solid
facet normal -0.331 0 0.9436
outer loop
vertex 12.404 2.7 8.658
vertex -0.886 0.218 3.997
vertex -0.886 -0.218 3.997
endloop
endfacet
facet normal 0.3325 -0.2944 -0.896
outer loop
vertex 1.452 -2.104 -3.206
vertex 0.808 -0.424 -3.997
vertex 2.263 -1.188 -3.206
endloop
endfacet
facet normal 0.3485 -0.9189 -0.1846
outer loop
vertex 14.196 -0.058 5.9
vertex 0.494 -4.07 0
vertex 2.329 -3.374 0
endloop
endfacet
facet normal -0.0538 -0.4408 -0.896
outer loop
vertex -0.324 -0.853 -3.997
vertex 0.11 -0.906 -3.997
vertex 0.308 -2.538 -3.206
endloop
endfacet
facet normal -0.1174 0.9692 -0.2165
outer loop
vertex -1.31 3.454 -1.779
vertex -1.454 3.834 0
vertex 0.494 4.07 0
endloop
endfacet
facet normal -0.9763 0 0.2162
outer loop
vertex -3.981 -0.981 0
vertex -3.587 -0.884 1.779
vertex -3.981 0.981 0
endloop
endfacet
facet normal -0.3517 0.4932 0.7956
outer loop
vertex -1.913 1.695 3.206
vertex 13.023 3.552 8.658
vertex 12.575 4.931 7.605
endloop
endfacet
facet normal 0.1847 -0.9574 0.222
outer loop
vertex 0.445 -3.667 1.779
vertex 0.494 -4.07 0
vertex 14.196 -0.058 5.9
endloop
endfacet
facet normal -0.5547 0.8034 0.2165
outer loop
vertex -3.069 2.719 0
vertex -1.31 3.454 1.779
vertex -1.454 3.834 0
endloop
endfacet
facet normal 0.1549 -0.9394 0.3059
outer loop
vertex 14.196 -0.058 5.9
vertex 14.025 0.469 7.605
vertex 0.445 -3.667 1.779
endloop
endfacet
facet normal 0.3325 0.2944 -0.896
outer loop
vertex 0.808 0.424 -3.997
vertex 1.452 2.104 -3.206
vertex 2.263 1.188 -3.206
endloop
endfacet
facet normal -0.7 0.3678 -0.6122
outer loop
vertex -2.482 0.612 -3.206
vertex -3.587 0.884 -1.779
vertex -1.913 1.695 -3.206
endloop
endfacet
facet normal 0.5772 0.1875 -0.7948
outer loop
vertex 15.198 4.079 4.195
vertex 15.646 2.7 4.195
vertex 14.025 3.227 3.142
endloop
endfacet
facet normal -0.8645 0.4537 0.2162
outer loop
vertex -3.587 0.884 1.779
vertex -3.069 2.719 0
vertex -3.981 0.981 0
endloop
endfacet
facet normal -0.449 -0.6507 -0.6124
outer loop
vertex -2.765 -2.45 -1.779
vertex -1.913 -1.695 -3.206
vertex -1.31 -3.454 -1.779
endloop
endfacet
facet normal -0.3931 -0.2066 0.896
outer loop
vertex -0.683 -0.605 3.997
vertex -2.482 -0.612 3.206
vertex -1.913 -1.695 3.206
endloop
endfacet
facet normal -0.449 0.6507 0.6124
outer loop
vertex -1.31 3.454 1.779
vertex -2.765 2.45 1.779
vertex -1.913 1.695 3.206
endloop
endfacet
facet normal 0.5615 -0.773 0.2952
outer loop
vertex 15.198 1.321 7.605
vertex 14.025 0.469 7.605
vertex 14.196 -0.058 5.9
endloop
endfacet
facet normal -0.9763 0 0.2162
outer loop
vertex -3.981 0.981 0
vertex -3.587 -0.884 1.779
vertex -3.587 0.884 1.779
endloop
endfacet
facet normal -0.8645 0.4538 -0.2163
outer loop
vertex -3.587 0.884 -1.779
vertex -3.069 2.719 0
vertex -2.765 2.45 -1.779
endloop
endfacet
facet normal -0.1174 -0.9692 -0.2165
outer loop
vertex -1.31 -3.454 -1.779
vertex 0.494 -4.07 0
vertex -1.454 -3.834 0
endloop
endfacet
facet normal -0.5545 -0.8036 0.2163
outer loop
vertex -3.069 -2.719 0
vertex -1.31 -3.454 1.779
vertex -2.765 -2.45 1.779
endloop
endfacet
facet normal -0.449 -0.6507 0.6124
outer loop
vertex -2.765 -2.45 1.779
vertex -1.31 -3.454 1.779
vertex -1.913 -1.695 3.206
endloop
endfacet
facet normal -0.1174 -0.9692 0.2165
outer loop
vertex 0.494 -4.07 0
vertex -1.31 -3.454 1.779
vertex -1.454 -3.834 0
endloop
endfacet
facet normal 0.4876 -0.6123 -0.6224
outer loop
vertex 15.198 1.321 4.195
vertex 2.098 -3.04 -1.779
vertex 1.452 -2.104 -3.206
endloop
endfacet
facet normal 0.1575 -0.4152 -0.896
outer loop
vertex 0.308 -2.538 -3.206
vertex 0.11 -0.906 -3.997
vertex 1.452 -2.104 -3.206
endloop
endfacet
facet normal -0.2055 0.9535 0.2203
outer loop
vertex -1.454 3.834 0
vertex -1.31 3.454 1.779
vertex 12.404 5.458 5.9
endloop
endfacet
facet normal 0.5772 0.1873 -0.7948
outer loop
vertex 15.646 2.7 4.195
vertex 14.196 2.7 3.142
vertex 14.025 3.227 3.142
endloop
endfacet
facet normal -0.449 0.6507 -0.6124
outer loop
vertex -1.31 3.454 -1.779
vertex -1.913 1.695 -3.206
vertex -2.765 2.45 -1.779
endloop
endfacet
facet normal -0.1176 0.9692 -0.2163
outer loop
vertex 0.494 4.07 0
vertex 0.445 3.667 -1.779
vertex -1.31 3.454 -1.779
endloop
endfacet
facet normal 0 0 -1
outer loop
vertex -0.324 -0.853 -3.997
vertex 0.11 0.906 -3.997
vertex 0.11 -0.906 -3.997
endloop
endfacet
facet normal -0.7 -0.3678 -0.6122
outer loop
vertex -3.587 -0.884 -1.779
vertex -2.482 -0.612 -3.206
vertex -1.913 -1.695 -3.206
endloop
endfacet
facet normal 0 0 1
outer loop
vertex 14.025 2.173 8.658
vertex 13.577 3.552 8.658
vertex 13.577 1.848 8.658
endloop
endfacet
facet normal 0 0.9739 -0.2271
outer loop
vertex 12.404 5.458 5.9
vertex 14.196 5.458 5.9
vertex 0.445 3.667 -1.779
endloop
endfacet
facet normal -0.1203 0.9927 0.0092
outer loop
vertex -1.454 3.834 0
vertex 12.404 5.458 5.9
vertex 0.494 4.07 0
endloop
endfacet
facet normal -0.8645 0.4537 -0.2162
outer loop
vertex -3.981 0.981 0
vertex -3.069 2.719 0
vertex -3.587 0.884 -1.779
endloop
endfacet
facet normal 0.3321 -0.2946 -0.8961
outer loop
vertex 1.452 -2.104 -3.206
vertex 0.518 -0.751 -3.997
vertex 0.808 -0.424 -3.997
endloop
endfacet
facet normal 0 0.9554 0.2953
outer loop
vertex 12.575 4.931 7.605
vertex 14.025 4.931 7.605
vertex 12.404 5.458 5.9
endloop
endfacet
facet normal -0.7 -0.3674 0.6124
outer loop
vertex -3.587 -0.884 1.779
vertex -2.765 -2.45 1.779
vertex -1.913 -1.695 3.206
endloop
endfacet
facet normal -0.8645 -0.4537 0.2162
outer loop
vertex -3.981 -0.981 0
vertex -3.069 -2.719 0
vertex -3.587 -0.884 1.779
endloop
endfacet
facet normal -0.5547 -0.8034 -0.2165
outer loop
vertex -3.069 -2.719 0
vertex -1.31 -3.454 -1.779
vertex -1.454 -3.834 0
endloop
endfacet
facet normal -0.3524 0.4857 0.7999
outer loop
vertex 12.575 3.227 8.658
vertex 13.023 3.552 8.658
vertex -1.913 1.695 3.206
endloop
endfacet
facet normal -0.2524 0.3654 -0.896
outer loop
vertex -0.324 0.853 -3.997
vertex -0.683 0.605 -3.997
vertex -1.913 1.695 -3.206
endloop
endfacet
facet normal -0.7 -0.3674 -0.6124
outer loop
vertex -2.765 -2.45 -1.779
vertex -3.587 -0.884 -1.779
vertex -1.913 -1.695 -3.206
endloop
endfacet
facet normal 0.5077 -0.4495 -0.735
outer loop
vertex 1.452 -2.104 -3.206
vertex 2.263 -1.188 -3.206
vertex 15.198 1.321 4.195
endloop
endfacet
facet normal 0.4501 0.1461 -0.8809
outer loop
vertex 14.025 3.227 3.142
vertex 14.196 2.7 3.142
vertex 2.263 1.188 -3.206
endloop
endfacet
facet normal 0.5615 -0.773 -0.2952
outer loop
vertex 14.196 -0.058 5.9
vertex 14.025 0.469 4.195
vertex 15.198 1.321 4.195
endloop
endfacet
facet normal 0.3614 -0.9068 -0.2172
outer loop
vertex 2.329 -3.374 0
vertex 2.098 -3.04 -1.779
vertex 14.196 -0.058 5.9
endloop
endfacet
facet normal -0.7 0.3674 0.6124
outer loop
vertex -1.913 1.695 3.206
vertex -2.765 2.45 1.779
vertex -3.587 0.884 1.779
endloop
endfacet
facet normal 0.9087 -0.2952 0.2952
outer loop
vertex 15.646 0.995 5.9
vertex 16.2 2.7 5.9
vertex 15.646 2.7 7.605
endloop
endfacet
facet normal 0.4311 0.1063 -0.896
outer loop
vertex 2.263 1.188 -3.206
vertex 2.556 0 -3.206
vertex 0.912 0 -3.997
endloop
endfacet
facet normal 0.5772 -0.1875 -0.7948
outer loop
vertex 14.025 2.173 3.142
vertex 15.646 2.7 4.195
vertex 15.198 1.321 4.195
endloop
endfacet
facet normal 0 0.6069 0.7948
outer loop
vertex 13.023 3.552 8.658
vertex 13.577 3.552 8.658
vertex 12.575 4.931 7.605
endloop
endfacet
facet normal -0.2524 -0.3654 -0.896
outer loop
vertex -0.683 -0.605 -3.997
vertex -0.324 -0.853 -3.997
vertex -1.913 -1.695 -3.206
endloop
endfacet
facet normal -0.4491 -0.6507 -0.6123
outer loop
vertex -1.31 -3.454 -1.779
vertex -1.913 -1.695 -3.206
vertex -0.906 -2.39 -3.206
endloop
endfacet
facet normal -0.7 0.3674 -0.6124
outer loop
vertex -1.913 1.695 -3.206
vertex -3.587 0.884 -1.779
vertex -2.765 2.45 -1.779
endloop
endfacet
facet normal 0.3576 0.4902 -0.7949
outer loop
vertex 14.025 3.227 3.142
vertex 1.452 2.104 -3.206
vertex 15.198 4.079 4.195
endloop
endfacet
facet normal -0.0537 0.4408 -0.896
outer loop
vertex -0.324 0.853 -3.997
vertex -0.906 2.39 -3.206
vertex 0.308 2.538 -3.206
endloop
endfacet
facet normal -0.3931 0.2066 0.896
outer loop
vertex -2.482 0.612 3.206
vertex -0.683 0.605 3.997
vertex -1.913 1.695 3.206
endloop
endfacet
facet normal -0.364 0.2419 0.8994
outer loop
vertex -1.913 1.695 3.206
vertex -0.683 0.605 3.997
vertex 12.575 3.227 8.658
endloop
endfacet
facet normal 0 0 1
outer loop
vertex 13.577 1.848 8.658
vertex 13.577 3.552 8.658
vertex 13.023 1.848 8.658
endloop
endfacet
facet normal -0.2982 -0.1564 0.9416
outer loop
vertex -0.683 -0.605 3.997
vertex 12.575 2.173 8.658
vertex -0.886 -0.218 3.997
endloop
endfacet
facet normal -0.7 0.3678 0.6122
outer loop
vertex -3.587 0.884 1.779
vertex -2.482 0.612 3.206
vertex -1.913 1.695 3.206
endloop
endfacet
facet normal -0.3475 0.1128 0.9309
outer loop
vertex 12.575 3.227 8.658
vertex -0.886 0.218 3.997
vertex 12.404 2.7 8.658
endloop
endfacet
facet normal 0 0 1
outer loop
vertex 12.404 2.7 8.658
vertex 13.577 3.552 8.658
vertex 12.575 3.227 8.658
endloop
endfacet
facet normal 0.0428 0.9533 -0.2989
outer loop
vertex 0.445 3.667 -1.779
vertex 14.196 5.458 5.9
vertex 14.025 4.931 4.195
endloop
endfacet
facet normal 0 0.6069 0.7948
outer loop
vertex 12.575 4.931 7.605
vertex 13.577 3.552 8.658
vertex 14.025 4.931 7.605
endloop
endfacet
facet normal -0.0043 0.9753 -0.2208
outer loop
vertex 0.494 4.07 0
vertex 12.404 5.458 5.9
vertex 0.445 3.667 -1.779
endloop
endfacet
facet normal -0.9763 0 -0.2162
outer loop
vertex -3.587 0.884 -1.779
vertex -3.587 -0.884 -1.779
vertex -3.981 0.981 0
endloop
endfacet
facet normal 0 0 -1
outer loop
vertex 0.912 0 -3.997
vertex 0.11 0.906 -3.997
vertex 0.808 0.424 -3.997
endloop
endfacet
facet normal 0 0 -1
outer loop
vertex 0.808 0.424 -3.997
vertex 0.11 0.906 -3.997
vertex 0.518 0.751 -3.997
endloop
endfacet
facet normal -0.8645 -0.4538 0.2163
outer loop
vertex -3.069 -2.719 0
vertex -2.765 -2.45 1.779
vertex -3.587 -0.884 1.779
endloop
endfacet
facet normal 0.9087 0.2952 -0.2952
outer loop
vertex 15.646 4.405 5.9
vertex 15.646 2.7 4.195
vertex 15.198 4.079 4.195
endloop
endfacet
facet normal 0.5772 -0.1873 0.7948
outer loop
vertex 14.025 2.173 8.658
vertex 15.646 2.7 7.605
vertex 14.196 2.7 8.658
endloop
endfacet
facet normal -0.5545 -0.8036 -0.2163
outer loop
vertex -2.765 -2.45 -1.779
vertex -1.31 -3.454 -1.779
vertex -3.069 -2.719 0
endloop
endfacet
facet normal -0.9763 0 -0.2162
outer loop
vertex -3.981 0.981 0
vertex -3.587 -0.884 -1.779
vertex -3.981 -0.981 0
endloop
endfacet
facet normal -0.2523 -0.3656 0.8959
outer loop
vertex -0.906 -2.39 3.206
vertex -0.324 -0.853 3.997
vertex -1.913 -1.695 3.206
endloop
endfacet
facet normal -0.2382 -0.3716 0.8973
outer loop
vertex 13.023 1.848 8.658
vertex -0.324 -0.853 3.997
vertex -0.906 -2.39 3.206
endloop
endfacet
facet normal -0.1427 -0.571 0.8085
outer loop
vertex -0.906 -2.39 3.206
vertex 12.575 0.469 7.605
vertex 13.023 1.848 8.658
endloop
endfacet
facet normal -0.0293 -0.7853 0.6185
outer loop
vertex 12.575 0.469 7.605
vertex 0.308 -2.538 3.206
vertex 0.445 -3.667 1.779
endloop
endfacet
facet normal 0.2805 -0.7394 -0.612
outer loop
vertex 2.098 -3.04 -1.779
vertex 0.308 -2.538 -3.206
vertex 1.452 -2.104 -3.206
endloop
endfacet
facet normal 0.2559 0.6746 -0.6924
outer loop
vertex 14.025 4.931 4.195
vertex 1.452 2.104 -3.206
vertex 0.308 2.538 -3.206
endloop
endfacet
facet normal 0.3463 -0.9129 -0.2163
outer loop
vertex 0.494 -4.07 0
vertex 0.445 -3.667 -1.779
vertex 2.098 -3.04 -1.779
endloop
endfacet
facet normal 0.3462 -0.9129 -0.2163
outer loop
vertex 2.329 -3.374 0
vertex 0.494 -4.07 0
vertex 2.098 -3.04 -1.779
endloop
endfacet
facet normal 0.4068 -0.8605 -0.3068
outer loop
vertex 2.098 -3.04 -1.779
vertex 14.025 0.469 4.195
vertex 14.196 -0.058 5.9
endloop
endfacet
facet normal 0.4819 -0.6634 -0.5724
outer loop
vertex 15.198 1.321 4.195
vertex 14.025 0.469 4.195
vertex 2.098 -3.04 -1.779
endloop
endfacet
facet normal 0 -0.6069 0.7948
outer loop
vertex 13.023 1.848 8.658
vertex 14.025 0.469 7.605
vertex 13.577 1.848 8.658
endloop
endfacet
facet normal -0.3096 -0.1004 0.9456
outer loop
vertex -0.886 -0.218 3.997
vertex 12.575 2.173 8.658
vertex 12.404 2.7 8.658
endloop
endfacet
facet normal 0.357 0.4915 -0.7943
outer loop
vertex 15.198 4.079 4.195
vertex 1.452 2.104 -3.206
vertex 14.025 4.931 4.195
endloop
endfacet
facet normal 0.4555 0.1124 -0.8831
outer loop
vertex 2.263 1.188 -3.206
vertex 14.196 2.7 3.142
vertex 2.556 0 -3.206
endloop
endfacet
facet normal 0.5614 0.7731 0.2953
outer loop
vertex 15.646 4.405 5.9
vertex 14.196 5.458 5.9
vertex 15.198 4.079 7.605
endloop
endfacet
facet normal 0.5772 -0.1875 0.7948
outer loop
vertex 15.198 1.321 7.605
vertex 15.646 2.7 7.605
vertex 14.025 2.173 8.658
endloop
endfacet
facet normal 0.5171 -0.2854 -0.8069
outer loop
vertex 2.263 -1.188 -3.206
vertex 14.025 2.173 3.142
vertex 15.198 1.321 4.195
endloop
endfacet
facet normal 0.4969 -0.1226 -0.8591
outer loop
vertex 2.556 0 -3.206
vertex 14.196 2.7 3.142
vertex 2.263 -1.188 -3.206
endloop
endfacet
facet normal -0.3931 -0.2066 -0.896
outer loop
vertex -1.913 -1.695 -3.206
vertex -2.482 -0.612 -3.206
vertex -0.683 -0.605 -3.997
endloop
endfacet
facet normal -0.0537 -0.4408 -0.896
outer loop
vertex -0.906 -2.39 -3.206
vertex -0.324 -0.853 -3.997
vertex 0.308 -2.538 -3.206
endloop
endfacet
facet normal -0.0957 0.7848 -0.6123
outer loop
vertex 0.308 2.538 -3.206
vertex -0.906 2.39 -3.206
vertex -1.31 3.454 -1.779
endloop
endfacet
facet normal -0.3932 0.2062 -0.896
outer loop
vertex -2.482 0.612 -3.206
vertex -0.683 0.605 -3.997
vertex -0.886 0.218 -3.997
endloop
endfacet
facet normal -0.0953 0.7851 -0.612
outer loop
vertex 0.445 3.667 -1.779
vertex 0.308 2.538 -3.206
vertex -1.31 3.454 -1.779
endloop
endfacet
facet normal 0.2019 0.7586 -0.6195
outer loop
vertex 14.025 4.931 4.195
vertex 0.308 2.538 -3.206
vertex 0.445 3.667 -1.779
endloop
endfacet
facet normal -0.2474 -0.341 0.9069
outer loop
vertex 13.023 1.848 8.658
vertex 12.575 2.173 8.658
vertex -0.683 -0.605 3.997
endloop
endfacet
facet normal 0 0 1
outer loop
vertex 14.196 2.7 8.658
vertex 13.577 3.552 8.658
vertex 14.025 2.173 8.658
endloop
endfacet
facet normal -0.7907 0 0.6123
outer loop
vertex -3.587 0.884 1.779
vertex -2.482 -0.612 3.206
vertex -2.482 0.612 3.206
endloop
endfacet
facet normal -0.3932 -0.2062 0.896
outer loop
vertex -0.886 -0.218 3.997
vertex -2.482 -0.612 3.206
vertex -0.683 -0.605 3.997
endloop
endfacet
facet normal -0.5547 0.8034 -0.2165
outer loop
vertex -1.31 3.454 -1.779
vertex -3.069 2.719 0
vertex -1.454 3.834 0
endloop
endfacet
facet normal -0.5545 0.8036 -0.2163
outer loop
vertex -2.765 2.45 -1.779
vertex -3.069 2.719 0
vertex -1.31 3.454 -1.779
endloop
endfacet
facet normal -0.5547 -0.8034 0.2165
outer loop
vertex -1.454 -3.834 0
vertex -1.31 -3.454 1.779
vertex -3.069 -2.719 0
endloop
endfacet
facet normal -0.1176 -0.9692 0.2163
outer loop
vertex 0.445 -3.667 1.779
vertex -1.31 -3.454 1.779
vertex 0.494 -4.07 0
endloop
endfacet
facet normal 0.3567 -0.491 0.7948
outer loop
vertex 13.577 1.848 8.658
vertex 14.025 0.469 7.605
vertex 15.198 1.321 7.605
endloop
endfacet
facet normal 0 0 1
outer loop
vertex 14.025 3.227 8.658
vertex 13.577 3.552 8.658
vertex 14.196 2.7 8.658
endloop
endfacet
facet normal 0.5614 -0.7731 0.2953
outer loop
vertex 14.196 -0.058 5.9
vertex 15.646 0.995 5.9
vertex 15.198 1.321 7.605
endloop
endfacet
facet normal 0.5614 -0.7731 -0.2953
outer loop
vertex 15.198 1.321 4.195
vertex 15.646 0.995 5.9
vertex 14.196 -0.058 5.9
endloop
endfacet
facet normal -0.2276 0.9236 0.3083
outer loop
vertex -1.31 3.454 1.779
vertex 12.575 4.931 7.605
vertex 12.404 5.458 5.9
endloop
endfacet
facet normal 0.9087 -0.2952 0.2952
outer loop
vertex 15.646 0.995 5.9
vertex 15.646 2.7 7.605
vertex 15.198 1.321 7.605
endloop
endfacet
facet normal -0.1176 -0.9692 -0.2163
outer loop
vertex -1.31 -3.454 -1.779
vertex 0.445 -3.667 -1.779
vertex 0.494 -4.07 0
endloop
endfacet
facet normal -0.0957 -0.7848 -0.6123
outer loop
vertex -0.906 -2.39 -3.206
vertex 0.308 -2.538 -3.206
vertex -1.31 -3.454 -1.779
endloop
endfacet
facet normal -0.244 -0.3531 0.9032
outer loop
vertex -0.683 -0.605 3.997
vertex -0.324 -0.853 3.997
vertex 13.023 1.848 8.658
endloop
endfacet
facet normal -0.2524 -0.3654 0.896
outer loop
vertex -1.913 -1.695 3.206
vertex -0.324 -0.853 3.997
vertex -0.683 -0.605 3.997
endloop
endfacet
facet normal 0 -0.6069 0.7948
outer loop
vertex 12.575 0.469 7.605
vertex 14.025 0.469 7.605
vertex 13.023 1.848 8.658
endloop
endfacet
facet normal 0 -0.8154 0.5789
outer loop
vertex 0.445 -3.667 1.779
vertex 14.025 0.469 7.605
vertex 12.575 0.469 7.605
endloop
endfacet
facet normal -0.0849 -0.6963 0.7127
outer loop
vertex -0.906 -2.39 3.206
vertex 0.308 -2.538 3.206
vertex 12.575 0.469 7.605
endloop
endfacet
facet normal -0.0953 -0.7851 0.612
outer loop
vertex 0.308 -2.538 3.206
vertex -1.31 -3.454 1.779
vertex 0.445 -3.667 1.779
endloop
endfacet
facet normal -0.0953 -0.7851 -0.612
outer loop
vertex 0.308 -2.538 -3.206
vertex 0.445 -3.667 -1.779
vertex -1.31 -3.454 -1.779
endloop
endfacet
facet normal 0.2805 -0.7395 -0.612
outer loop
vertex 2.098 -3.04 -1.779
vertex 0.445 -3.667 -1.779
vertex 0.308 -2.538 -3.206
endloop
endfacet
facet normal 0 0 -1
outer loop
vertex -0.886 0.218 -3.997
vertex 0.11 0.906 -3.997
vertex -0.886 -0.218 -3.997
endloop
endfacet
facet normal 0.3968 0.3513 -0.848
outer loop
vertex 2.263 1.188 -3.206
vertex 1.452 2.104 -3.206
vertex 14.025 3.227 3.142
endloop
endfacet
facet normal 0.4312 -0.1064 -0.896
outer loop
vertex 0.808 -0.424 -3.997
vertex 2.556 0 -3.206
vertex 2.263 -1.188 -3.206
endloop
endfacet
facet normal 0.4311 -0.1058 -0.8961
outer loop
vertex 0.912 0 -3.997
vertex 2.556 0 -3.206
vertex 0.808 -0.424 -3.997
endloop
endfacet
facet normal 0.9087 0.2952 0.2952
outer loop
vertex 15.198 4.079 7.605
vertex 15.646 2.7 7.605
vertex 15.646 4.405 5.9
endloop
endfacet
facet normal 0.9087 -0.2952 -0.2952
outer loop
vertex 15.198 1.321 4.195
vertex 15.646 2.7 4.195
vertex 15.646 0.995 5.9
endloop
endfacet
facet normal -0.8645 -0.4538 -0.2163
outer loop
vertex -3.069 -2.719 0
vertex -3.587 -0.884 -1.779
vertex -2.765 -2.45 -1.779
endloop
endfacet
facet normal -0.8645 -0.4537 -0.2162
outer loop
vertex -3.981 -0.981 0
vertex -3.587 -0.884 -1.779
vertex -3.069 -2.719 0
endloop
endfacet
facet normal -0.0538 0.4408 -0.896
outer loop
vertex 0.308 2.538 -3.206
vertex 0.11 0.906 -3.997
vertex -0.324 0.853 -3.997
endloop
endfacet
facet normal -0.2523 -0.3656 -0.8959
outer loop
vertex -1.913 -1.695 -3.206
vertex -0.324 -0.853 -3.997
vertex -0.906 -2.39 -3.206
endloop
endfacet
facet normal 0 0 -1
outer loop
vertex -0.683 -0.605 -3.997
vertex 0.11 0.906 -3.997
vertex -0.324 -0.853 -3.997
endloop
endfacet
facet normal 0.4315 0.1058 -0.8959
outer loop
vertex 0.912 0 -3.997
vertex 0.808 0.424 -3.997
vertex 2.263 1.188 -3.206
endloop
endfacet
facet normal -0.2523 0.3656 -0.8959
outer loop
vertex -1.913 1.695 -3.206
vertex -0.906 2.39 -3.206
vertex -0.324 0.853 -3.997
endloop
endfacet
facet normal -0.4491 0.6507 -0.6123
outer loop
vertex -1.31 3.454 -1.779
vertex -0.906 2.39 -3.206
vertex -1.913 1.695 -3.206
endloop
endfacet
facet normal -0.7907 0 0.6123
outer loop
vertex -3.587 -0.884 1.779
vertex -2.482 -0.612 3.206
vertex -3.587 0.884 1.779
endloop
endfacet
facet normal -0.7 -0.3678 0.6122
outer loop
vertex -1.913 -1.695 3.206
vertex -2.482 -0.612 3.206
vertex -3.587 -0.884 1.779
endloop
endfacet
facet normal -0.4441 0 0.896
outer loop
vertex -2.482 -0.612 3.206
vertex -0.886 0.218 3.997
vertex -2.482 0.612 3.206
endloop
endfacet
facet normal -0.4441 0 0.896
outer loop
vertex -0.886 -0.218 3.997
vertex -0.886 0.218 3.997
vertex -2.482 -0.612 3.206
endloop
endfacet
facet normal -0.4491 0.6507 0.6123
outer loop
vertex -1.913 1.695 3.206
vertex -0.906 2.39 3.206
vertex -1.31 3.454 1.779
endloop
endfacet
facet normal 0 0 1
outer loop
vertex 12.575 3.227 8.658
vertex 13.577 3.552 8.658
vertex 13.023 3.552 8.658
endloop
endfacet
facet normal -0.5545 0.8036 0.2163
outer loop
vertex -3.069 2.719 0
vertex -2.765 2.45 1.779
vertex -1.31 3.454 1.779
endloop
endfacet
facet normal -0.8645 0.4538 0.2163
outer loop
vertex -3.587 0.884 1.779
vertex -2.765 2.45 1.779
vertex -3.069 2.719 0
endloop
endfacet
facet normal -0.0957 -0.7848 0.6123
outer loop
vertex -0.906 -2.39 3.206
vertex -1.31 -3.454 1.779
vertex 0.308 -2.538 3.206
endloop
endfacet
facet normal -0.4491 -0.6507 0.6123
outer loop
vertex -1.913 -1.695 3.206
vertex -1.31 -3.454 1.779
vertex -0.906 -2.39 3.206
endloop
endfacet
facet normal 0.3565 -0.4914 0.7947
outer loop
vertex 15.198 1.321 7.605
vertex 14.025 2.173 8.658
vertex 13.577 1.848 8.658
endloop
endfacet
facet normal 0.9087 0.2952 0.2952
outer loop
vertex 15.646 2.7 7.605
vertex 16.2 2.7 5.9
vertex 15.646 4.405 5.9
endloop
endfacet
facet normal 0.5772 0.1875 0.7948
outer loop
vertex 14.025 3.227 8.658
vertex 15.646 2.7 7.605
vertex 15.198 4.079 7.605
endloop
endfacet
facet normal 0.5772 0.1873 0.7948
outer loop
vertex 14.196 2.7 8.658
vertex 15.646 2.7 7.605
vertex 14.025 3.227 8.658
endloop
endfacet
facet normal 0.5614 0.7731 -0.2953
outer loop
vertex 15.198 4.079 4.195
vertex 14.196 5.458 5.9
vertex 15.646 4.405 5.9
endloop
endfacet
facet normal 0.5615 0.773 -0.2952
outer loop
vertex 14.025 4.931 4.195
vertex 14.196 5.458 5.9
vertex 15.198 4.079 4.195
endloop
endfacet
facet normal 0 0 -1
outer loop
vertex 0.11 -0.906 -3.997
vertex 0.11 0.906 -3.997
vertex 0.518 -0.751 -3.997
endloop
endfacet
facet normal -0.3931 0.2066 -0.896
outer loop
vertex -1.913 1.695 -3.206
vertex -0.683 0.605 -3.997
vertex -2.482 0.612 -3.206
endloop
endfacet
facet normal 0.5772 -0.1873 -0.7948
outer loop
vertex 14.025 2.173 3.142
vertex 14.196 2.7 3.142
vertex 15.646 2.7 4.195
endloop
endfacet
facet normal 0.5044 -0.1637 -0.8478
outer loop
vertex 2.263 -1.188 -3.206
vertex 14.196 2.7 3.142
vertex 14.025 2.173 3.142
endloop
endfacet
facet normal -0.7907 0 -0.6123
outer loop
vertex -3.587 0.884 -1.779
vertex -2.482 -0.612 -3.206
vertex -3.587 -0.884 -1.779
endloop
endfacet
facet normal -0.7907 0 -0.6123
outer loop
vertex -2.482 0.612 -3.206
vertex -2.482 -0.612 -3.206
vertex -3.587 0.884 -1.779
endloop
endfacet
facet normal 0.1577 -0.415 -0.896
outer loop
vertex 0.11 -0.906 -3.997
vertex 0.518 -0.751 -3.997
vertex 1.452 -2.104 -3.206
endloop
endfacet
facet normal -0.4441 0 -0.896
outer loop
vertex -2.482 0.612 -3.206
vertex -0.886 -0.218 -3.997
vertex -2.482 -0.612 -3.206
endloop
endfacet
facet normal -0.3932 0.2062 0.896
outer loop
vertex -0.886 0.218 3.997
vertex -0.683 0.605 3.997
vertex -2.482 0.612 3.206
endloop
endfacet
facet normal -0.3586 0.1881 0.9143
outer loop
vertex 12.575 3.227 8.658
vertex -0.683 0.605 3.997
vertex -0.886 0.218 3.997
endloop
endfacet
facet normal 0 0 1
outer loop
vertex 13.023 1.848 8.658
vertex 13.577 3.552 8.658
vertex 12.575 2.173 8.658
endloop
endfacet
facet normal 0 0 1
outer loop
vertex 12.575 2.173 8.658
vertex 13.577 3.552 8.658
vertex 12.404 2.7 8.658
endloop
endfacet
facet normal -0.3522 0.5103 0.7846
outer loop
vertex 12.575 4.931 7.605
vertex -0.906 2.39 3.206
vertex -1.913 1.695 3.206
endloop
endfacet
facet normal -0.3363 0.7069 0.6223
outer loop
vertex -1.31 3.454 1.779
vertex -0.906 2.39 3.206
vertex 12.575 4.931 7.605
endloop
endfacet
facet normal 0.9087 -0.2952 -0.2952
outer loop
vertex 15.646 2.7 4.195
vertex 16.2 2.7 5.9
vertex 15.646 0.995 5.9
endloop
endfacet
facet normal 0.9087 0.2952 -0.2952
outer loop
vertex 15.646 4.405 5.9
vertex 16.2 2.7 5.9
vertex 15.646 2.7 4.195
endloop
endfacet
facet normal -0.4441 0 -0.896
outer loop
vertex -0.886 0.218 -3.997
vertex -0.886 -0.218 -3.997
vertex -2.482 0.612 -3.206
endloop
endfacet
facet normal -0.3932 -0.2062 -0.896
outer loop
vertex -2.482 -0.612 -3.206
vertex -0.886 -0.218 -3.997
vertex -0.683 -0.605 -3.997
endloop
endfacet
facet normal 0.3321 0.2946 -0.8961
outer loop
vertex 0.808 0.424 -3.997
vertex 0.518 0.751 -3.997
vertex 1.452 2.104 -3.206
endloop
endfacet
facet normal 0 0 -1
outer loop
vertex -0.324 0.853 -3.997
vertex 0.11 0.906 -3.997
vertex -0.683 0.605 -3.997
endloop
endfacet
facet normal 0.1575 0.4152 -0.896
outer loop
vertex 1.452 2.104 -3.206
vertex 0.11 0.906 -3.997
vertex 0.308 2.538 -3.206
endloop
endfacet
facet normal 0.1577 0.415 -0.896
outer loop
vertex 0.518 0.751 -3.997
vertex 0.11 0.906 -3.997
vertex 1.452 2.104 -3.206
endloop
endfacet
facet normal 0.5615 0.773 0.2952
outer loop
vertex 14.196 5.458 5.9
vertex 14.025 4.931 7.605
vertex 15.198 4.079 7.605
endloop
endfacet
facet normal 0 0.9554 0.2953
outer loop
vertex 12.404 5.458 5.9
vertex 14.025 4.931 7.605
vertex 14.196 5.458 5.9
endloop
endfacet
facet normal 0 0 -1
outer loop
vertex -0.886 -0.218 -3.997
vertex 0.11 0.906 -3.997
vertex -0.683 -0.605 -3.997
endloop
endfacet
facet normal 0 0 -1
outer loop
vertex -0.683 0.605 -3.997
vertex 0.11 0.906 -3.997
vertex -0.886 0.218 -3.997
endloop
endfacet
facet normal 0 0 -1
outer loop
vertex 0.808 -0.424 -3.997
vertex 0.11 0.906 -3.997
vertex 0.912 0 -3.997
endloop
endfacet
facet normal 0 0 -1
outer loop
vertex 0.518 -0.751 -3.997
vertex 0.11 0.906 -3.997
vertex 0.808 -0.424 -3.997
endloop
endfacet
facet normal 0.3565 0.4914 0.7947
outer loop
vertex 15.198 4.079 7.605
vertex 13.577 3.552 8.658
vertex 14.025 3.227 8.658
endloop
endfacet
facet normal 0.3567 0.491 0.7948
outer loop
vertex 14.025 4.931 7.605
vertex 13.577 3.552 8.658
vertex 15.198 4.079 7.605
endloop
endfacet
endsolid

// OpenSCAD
hull() { sphere(r = 4.1); translate([13.3, 2.7, 5.9]) sphere(r = 2.9); }
